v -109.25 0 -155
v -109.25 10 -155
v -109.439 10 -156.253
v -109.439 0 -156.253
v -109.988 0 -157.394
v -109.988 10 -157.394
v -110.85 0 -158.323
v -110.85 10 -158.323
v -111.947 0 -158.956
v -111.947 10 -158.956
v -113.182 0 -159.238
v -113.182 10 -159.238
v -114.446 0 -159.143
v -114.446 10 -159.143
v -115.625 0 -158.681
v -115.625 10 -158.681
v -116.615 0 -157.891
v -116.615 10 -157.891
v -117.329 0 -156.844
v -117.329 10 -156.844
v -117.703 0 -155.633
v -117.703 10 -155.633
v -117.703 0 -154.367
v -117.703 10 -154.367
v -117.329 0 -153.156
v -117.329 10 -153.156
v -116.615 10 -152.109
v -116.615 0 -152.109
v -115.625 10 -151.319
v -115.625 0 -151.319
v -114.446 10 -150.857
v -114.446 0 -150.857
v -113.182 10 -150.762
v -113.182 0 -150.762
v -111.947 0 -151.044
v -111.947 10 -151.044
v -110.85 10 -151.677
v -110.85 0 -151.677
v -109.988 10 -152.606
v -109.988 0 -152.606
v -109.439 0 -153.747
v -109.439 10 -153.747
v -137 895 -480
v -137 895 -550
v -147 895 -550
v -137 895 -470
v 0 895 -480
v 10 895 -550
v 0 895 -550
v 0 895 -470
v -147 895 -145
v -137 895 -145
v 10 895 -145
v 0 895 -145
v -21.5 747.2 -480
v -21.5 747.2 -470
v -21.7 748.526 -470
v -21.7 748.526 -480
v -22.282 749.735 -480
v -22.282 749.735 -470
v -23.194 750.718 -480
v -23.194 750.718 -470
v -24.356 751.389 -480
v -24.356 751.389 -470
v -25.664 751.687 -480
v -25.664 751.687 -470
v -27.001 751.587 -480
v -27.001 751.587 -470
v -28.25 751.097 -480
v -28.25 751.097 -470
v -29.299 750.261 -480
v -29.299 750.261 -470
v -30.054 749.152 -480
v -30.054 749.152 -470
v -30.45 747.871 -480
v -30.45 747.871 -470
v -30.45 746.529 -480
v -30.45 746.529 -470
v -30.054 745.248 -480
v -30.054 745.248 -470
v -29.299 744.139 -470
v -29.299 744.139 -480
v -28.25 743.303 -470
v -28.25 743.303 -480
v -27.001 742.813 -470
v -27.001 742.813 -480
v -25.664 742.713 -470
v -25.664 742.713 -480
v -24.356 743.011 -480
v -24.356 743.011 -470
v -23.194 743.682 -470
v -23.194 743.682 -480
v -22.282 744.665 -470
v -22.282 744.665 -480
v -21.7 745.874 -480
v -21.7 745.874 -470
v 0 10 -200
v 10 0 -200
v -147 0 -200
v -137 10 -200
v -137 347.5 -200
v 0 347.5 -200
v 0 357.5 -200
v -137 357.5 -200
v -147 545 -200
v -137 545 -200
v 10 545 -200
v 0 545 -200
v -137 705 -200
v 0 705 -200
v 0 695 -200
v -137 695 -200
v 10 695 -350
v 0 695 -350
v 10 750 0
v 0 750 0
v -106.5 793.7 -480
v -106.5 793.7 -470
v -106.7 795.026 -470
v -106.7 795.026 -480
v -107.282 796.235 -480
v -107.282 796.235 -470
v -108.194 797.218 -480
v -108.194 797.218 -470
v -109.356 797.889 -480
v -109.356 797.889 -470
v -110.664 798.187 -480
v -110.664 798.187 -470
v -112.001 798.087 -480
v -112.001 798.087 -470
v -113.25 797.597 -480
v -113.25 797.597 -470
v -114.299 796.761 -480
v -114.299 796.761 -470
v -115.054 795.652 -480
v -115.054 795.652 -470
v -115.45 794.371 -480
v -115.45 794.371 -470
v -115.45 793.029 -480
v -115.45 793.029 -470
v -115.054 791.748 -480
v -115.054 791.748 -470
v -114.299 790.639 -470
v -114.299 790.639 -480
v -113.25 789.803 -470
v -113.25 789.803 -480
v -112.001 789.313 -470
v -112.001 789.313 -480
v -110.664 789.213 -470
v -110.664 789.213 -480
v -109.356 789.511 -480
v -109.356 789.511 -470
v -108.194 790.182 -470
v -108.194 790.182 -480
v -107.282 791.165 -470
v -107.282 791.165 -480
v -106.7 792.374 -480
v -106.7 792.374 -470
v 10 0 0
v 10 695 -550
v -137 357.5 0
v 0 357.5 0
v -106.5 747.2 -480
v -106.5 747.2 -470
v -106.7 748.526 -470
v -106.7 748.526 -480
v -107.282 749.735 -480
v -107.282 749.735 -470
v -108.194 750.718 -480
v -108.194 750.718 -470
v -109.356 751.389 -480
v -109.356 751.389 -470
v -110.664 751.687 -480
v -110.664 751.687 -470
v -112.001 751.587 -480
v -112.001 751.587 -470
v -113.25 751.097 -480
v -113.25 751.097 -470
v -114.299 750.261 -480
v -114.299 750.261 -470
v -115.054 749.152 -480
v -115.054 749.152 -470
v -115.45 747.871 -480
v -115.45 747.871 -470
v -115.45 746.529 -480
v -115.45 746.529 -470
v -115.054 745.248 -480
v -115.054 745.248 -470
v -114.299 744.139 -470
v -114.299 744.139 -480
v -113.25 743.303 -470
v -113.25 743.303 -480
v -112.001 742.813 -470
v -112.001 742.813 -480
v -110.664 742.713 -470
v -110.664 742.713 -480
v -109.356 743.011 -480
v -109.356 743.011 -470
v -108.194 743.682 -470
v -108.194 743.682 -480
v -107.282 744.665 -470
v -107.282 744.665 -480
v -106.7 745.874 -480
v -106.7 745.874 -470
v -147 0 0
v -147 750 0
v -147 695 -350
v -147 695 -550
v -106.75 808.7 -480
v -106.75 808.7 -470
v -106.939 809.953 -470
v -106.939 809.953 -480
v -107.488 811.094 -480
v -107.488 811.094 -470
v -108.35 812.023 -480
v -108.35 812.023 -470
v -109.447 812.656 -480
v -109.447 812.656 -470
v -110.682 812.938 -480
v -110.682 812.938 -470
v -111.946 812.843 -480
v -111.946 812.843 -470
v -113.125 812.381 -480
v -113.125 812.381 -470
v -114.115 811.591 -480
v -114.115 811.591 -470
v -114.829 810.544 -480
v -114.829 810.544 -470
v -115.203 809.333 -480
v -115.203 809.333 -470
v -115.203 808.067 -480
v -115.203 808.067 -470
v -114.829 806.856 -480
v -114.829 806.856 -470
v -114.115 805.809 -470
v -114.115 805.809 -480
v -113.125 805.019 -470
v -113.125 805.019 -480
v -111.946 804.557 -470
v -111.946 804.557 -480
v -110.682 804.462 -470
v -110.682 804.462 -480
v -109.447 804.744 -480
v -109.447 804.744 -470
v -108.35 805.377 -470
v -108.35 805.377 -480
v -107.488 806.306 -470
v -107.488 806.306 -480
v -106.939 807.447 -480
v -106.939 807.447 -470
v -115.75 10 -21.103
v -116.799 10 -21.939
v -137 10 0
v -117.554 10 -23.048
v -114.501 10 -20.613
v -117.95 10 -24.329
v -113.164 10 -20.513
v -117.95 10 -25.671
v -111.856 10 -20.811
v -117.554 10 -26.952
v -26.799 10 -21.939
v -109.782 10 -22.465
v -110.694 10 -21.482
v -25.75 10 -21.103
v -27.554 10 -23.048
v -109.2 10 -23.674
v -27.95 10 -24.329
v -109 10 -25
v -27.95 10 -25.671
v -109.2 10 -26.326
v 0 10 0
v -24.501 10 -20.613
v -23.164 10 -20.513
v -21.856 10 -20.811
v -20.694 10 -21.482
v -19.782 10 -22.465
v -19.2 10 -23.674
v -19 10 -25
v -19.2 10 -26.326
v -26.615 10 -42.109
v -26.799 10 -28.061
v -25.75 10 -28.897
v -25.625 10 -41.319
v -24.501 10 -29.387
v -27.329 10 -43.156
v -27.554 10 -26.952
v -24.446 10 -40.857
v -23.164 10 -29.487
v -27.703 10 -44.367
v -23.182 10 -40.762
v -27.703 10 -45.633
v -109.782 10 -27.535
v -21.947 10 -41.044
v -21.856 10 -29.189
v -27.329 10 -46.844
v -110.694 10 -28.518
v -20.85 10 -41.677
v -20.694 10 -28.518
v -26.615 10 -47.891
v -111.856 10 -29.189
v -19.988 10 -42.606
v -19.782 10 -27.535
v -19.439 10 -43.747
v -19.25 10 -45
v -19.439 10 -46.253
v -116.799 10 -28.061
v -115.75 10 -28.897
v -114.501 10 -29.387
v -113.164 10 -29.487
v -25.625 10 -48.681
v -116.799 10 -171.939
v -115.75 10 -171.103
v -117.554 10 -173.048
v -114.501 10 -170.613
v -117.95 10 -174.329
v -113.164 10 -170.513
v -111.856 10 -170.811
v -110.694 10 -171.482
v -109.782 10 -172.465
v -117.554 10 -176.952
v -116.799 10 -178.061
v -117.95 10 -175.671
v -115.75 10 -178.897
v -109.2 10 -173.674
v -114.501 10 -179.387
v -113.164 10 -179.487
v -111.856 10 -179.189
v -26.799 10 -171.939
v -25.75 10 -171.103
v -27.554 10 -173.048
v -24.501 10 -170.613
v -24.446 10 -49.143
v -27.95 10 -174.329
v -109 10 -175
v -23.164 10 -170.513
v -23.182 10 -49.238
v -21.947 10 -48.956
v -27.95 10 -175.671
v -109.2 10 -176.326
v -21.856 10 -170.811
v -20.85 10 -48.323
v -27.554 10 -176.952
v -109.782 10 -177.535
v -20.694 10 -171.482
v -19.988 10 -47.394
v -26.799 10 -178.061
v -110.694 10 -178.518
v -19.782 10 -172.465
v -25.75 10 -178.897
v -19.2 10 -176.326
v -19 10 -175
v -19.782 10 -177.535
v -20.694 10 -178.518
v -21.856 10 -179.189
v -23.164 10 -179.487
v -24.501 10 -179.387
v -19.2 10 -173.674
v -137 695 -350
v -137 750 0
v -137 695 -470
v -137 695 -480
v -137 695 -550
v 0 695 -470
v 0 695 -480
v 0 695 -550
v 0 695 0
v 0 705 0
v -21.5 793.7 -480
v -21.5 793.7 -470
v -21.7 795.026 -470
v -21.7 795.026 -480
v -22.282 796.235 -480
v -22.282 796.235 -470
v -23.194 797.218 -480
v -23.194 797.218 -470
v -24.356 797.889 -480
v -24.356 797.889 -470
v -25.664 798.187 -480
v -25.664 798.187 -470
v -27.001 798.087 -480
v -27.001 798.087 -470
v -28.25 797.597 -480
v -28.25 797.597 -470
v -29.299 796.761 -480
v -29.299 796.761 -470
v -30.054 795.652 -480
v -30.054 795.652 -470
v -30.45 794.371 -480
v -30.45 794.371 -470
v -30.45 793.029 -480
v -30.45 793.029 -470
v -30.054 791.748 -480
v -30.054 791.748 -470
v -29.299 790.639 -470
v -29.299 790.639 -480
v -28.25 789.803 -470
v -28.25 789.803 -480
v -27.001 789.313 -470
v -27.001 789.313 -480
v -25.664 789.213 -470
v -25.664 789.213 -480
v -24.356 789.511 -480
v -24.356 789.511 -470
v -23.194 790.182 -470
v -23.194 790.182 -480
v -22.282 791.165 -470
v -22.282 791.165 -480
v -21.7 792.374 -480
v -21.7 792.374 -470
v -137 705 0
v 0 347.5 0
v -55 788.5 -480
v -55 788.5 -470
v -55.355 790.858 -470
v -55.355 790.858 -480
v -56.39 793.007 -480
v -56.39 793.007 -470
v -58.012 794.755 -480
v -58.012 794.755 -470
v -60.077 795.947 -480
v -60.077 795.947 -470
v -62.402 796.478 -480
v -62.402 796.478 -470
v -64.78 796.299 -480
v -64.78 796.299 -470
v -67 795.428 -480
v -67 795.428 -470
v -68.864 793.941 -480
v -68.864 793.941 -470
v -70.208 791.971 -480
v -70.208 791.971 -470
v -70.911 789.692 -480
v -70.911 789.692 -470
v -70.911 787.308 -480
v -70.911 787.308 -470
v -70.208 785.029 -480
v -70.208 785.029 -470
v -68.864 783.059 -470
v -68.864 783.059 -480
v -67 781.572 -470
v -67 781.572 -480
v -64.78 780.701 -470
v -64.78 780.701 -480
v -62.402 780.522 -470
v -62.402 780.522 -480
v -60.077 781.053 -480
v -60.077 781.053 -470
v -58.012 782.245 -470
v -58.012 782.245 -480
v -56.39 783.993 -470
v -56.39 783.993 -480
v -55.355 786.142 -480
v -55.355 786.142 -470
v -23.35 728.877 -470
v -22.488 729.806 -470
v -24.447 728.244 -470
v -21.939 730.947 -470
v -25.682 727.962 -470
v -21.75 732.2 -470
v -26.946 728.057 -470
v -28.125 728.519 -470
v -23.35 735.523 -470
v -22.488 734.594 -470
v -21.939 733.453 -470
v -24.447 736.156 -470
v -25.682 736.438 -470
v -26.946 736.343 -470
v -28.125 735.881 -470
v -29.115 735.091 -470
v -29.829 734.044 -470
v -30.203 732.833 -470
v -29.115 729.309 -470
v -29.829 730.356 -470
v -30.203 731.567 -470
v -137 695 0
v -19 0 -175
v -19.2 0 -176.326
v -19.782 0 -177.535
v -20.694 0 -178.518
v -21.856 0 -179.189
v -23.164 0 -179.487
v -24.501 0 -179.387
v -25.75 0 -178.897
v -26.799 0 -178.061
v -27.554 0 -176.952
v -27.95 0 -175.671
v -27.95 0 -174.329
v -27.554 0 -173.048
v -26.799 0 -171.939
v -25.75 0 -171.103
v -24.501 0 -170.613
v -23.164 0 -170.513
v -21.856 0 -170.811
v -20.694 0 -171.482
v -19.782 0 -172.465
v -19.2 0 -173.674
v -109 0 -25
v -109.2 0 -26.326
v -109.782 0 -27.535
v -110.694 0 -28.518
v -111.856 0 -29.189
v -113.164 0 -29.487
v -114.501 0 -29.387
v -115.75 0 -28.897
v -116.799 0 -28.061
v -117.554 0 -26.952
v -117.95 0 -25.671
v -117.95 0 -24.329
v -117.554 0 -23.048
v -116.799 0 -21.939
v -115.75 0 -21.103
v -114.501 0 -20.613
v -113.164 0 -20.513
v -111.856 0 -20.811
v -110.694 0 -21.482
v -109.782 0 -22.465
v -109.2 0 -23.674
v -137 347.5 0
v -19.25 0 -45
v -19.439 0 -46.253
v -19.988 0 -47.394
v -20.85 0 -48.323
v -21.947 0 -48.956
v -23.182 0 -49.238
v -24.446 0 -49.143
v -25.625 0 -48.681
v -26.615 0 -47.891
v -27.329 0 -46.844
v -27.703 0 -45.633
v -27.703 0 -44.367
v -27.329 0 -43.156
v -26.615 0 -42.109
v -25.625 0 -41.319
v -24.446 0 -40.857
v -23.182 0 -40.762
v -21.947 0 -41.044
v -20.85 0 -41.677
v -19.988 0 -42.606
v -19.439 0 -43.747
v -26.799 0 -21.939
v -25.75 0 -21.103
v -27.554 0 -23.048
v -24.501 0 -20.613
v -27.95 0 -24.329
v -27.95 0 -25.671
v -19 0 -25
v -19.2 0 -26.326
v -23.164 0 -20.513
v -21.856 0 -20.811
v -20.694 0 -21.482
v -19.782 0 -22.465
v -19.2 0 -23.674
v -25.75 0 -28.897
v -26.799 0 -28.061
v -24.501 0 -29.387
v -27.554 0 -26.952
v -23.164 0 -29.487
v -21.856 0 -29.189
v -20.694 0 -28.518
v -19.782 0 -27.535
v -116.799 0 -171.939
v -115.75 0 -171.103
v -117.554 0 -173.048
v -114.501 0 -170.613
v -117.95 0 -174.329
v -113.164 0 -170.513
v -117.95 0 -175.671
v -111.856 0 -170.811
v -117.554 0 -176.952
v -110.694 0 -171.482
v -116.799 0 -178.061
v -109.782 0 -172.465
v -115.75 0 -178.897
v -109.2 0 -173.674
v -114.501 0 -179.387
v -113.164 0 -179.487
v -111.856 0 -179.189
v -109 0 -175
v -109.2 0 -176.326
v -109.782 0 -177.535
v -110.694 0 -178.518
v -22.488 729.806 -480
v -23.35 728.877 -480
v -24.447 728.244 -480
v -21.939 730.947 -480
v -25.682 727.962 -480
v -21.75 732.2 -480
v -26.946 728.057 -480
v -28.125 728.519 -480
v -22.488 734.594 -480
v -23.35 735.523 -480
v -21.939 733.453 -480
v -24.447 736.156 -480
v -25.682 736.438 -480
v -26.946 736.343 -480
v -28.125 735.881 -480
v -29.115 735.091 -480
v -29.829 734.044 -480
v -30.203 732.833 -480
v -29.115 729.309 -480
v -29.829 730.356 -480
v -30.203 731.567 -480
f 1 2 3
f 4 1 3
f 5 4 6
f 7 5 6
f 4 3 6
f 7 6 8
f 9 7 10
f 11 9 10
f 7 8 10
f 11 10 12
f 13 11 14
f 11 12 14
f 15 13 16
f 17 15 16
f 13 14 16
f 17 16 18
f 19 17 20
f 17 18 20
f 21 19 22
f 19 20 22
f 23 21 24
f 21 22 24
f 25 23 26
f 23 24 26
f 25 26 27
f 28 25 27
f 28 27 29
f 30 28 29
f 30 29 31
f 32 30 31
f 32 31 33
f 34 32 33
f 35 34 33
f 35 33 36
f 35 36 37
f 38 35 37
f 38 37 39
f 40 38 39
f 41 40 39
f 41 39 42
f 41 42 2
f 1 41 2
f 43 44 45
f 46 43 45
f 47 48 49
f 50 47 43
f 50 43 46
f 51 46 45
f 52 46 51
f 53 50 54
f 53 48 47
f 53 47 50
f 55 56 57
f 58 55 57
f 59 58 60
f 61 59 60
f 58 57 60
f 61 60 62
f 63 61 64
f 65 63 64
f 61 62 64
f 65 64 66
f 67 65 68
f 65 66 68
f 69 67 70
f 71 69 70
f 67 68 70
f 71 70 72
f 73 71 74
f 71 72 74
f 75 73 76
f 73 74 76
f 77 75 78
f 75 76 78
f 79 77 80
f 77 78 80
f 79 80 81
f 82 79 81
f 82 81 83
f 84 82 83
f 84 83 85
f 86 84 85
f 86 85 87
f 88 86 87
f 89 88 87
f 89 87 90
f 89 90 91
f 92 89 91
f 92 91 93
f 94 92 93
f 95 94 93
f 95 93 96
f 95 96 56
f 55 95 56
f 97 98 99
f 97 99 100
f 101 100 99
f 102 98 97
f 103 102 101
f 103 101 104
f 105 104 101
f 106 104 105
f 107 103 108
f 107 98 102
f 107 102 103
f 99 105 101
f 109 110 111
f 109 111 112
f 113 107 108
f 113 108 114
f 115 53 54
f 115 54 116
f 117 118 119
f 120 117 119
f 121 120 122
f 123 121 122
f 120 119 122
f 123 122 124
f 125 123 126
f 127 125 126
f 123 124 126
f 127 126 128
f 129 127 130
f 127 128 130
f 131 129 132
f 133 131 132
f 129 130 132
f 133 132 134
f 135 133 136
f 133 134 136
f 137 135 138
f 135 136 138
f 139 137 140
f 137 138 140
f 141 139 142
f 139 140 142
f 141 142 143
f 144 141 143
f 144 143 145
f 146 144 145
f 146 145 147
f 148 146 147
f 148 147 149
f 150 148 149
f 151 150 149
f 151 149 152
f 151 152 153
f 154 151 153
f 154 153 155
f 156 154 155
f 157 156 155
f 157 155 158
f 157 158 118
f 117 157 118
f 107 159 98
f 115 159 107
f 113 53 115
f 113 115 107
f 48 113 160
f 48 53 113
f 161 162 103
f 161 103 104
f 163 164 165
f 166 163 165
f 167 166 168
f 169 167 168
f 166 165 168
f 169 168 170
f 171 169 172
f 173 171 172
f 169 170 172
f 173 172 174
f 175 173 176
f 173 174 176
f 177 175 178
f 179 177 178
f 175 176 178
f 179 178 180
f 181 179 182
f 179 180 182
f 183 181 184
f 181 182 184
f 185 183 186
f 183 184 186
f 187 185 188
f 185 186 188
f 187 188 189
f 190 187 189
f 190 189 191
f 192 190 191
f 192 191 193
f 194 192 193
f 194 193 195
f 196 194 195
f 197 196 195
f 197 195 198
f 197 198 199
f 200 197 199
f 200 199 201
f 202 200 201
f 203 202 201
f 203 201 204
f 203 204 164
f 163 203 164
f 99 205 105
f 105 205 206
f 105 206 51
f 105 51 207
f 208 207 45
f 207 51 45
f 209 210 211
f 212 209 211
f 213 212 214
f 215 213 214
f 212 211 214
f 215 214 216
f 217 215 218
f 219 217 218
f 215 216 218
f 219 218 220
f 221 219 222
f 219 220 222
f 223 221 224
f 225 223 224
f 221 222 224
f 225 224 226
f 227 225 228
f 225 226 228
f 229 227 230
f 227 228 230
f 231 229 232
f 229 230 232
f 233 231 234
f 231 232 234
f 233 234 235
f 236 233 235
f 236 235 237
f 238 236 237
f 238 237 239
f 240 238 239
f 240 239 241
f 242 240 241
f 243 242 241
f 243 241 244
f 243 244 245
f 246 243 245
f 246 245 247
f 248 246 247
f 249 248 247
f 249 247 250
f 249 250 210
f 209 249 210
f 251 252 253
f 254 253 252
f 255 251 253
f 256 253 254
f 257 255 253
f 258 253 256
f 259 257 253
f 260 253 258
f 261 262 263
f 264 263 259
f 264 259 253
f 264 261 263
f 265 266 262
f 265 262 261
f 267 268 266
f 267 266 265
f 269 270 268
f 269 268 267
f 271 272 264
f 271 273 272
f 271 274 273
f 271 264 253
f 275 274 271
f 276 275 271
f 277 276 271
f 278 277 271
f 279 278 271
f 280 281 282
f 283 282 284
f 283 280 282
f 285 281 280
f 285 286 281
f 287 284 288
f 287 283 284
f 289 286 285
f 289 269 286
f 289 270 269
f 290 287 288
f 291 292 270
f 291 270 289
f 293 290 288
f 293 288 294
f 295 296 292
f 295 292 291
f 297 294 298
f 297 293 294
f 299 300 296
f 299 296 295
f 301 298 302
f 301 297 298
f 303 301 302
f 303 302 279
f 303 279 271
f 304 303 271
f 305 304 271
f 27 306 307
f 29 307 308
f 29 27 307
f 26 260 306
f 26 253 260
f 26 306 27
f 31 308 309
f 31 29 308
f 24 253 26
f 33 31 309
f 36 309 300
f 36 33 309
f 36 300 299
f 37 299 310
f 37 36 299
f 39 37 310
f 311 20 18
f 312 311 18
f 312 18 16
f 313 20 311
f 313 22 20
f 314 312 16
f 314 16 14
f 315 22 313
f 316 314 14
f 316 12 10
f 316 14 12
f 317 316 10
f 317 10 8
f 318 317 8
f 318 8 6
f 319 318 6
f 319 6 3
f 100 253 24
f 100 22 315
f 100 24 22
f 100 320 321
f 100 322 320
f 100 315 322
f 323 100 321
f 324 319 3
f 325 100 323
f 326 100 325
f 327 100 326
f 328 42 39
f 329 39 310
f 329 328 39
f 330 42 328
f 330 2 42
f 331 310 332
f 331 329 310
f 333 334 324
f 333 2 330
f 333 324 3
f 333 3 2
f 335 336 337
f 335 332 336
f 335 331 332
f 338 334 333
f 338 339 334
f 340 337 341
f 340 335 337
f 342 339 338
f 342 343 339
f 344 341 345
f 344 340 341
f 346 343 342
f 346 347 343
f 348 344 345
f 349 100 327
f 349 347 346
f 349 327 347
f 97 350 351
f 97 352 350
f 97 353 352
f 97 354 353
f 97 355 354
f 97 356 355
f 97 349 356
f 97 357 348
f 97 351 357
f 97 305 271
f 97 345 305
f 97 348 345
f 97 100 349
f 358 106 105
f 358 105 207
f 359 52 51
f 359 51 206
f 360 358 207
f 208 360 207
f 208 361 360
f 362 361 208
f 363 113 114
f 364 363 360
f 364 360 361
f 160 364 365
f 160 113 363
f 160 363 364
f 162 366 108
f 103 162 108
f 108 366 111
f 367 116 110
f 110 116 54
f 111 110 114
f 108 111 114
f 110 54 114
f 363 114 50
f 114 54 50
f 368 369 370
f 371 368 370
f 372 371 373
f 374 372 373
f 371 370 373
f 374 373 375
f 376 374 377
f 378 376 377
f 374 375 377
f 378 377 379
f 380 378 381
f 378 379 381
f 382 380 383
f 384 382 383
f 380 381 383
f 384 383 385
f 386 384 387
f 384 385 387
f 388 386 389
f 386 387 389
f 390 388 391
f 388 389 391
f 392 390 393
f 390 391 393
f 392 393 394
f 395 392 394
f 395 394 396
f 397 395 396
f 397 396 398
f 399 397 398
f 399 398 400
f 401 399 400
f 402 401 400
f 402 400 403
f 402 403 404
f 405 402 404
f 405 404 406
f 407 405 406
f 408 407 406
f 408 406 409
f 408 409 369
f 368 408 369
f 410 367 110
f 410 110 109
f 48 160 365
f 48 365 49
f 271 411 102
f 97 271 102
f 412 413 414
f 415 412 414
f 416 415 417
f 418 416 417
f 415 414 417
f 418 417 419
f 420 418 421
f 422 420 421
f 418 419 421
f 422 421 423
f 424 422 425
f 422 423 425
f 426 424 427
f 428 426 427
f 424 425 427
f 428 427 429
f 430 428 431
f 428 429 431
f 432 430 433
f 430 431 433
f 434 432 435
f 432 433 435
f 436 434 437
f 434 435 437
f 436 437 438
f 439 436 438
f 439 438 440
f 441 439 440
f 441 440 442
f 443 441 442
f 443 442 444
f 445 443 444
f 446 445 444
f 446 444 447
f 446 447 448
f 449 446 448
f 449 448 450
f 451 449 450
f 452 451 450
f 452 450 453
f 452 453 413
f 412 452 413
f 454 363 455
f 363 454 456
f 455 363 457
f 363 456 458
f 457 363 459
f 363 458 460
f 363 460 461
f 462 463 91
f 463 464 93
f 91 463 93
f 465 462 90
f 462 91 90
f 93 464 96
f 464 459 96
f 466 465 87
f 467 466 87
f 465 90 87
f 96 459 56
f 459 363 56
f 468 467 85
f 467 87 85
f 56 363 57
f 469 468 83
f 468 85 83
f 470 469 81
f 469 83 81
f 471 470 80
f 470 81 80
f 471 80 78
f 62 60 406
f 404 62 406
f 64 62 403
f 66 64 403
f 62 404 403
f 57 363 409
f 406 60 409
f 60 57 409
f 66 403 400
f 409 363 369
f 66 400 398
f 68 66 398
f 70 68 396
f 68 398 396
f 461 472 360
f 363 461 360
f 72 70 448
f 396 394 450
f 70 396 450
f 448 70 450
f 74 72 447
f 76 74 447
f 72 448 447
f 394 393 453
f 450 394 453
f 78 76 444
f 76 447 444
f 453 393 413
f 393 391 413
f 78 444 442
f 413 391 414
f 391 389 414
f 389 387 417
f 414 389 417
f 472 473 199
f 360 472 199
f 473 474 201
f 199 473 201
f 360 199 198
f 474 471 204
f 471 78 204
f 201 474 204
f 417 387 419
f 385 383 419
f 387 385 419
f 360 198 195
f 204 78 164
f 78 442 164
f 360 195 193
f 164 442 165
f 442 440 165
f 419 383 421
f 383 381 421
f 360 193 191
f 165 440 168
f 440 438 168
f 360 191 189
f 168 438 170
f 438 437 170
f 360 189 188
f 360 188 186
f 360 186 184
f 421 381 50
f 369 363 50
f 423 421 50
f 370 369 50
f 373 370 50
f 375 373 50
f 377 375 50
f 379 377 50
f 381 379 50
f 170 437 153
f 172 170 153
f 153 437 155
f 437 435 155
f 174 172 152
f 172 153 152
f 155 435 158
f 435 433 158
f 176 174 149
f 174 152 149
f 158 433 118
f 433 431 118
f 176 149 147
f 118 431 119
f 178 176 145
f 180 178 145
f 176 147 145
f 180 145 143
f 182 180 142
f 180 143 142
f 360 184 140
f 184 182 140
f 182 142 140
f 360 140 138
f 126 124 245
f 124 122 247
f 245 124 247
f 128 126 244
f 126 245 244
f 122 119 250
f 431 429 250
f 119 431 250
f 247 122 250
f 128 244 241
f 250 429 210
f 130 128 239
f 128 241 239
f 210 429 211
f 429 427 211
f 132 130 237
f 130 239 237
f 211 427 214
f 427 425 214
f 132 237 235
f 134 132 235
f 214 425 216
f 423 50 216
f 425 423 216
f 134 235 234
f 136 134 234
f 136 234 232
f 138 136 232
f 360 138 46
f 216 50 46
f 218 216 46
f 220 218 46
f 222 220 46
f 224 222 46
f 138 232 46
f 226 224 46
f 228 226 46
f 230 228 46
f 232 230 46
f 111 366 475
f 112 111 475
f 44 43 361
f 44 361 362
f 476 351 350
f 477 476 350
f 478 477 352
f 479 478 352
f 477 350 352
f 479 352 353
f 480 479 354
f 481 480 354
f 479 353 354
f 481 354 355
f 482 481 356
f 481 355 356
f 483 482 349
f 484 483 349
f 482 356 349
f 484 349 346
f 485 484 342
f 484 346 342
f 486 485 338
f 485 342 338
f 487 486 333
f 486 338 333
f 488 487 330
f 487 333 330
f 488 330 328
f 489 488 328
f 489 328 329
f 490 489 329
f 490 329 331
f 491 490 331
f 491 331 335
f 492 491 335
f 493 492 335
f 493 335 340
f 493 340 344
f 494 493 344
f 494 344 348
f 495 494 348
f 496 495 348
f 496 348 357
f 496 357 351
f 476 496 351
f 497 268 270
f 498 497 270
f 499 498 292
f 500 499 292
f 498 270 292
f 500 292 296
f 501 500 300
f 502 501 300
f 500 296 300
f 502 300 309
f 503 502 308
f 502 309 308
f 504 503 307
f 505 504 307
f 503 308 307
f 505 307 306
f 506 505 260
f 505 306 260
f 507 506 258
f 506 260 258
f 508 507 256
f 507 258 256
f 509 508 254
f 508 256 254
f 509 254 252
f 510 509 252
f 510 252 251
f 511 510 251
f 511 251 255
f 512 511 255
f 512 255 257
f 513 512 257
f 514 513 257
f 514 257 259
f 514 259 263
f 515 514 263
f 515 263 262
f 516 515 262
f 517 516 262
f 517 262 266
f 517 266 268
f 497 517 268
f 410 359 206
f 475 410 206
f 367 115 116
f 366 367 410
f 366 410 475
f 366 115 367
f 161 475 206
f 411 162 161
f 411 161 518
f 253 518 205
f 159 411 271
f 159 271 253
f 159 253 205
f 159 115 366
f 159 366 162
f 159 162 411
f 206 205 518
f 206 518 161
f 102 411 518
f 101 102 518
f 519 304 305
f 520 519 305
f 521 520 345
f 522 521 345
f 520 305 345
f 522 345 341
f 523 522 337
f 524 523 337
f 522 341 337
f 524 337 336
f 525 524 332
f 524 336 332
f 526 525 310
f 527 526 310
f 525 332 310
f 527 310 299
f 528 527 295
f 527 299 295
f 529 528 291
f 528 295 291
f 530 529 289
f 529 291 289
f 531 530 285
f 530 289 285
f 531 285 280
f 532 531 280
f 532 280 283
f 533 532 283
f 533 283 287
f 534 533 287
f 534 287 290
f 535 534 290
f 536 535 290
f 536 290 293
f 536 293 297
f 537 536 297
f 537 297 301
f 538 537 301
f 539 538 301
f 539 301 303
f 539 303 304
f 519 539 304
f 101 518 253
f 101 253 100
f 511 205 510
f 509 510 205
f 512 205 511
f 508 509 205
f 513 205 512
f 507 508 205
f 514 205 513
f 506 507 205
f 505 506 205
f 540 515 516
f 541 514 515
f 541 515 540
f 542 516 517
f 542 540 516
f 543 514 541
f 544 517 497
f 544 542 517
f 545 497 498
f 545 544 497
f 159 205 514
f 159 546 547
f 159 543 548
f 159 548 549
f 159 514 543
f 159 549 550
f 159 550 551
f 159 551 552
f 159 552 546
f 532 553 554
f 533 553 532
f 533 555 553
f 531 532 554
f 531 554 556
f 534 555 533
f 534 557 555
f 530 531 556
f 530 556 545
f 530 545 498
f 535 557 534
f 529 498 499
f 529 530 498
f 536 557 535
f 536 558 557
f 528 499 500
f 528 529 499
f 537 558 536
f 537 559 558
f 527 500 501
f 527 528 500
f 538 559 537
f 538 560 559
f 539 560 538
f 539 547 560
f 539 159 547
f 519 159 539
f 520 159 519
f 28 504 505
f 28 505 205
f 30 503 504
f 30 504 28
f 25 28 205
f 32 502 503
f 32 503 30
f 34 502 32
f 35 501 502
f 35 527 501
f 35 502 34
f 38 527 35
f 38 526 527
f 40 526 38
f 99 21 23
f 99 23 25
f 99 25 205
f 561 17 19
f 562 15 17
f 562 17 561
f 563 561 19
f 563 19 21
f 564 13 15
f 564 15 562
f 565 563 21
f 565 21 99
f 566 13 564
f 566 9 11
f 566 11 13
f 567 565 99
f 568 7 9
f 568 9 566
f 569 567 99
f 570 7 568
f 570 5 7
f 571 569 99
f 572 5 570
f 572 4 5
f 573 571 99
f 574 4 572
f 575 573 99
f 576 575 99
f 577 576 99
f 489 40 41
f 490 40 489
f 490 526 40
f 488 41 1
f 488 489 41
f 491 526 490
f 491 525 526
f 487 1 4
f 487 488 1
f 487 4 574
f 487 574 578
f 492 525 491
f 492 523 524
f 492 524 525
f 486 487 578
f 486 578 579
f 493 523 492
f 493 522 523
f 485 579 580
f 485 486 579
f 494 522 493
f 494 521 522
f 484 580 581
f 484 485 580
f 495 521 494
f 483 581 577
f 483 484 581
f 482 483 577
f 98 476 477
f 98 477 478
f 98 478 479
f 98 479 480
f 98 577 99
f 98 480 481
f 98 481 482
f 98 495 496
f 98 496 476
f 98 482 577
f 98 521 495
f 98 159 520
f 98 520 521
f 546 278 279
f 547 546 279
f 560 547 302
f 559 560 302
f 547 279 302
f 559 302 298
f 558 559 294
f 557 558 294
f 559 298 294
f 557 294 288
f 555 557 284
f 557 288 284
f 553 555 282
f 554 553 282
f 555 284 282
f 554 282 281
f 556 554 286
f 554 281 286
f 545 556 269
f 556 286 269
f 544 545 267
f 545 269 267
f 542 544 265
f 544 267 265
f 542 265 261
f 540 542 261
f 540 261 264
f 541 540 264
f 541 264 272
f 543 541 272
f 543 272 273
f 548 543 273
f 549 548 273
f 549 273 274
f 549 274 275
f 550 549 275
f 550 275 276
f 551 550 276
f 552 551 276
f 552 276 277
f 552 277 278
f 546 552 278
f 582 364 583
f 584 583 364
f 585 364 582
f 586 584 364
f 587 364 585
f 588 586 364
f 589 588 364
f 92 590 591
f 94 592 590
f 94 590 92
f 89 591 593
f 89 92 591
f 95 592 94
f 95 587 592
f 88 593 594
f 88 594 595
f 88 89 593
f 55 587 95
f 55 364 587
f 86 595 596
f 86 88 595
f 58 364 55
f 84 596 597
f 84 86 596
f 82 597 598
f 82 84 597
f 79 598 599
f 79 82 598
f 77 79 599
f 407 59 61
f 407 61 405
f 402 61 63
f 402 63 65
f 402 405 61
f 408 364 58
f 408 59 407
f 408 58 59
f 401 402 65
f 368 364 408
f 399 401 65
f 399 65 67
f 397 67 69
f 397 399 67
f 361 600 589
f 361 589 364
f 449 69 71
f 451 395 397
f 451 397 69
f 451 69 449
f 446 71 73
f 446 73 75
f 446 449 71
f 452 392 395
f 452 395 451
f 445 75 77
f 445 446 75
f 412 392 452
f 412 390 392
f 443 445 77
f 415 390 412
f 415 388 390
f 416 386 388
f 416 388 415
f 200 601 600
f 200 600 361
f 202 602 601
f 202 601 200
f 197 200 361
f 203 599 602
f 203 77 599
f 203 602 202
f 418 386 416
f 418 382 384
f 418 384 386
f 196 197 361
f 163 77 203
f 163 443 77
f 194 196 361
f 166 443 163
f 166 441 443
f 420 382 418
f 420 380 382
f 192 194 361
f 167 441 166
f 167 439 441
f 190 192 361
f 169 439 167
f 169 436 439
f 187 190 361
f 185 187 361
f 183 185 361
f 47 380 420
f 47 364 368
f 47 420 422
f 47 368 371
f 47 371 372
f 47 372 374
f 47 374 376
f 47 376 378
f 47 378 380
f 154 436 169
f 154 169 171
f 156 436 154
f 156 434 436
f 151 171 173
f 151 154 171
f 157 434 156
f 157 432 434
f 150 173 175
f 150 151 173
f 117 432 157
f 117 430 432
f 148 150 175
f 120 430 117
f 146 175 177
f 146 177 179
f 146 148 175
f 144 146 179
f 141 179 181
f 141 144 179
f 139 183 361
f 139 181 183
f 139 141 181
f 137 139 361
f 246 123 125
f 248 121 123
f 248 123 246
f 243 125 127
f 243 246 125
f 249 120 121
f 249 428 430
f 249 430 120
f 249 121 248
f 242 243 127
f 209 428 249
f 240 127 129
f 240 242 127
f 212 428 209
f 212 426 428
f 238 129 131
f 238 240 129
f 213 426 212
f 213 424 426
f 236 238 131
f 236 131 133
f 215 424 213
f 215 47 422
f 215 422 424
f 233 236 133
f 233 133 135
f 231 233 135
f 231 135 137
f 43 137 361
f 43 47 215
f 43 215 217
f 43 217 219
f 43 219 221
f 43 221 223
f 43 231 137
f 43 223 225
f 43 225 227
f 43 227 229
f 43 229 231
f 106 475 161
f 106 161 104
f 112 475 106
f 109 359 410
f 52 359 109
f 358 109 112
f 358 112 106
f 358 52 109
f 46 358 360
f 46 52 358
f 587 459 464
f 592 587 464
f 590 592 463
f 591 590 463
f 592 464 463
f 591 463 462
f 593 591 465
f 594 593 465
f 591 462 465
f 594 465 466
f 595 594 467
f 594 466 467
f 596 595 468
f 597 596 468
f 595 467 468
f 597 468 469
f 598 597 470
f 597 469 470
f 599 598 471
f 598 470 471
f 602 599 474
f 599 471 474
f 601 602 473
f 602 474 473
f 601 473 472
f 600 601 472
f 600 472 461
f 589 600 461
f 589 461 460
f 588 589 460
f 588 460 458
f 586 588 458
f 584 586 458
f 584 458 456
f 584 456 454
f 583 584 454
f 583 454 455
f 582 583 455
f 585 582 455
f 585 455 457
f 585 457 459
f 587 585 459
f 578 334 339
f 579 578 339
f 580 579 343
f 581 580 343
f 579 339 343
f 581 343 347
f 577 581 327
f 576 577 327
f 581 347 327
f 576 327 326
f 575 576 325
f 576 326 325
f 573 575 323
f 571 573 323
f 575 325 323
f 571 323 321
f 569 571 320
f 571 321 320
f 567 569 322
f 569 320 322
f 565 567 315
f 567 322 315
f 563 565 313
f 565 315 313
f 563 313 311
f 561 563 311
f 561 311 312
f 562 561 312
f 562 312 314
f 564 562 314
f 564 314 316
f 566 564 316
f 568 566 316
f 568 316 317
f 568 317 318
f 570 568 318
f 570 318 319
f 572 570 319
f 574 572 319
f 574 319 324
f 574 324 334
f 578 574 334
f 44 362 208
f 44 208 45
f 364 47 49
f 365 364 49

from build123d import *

# Parameters (mm, degrees)
BOSS_EXTRUDE1_DEPTH      = 10
BOSS_EXTRUDE1_DEPTH_BACK = 147
SKETCH3_W                = 137
SKETCH3_H                = 550
CUT_EXTRUDE1_DEPTH       = 885
SKETCH4_W                = 137
SKETCH4_H                = 200
BOSS_EXTRUDE2_DEPTH      = 10
CUT_EXTRUDE3_REACH       = 82
SKETCH6_R                = 4.5
SKETCH6_R_2              = 8
SKETCH6_R_3              = 4.25
SKETCH8_W                = 157
SKETCH8_H                = 200
BOSS_EXTRUDE3_DEPTH      = 10
LPATTERN1_COUNT          = 3
LPATTERN1_PITCH          = 347.5
CUT_EXTRUDE4_REACH       = 12
SKETCH7_R                = 4.5
SKETCH7_R_2              = 4.25


with BuildPart() as part:
    # Sketch1 → Boss-Extrude1 (new body, two sides)
    with BuildSketch(Plane(origin=(0, 0, 0), x_dir=(0, 0, -1), z_dir=(1, 0, 0))) as boss_extrude1_sk:
        Polygon((200, 695), (200, 545), (350, 695), align=None)
        Polygon((200, 0), (200, 695), (550, 695), (550, 895), (145, 895), (0, 750), (0, 0), align=None)
    extrude(amount=BOSS_EXTRUDE1_DEPTH)
    extrude(boss_extrude1_sk.sketch, amount=-BOSS_EXTRUDE1_DEPTH_BACK)

    # Sketch3 → Cut-Extrude1 (cut)
    with BuildSketch(Plane(origin=(0, 895, 0), x_dir=(1, 0, 0), z_dir=(0, 1, 0))):
        with Locations((-68.5, 275)):
            Rectangle(SKETCH3_W, SKETCH3_H)
    extrude(amount=-CUT_EXTRUDE1_DEPTH, mode=Mode.SUBTRACT)

    # Sketch4 → Boss-Extrude2 (add)
    with BuildSketch(Plane(origin=(0, 0, -480), x_dir=(-1, 0, 0), z_dir=(0, 0, -1))):
        with Locations((68.5, 795)):
            Rectangle(SKETCH4_W, SKETCH4_H)
    extrude(amount=-BOSS_EXTRUDE2_DEPTH)

    # Sketch6 → Cut-Extrude3 (cut, up to next)
    with BuildSketch(Plane.XY.offset(-470), mode=Mode.PRIVATE) as cut_extrude3_sk1:
        with Locations((-111, 747.2)):
            Circle(SKETCH6_R)
    cut_extrude3_tool1 = extrude(cut_extrude3_sk1.sketch, amount=-CUT_EXTRUDE3_REACH, mode=Mode.PRIVATE) & part.part
    add(cut_extrude3_tool1.solids().sort_by_distance((-111, 747.2, -470))[0], mode=Mode.SUBTRACT)
    # Sketch6 → Cut-Extrude3 (cut, up to next)
    with BuildSketch(Plane.XY.offset(-470), mode=Mode.PRIVATE) as cut_extrude3_sk2:
        with Locations((-26, 747.2)):
            Circle(SKETCH6_R)
    cut_extrude3_tool2 = extrude(cut_extrude3_sk2.sketch, amount=-CUT_EXTRUDE3_REACH, mode=Mode.PRIVATE) & part.part
    add(cut_extrude3_tool2.solids().sort_by_distance((-26, 747.2, -470))[0], mode=Mode.SUBTRACT)
    # Sketch6 → Cut-Extrude3 (cut, up to next)
    with BuildSketch(Plane.XY.offset(-470), mode=Mode.PRIVATE) as cut_extrude3_sk3:
        with Locations((-111, 793.7)):
            Circle(SKETCH6_R)
    cut_extrude3_tool3 = extrude(cut_extrude3_sk3.sketch, amount=-CUT_EXTRUDE3_REACH, mode=Mode.PRIVATE) & part.part
    add(cut_extrude3_tool3.solids().sort_by_distance((-111, 793.7, -470))[0], mode=Mode.SUBTRACT)
    # Sketch6 → Cut-Extrude3 (cut, up to next)
    with BuildSketch(Plane.XY.offset(-470), mode=Mode.PRIVATE) as cut_extrude3_sk4:
        with Locations((-26, 793.7)):
            Circle(SKETCH6_R)
    cut_extrude3_tool4 = extrude(cut_extrude3_sk4.sketch, amount=-CUT_EXTRUDE3_REACH, mode=Mode.PRIVATE) & part.part
    add(cut_extrude3_tool4.solids().sort_by_distance((-26, 793.7, -470))[0], mode=Mode.SUBTRACT)
    # Sketch6 → Cut-Extrude3 (cut, up to next)
    with BuildSketch(Plane.XY.offset(-470), mode=Mode.PRIVATE) as cut_extrude3_sk5:
        with Locations((-63, 788.5)):
            Circle(SKETCH6_R_2)
    cut_extrude3_tool5 = extrude(cut_extrude3_sk5.sketch, amount=-CUT_EXTRUDE3_REACH, mode=Mode.PRIVATE) & part.part
    add(cut_extrude3_tool5.solids().sort_by_distance((-63, 788.5, -470))[0], mode=Mode.SUBTRACT)
    # Sketch6 → Cut-Extrude3 (cut, up to next)
    with BuildSketch(Plane.XY.offset(-470), mode=Mode.PRIVATE) as cut_extrude3_sk6:
        with Locations((-111, 808.7)):
            Circle(SKETCH6_R_3)
    cut_extrude3_tool6 = extrude(cut_extrude3_sk6.sketch, amount=-CUT_EXTRUDE3_REACH, mode=Mode.PRIVATE) & part.part
    add(cut_extrude3_tool6.solids().sort_by_distance((-111, 808.7, -470))[0], mode=Mode.SUBTRACT)
    # Sketch6 → Cut-Extrude3 (cut, up to next)
    with BuildSketch(Plane.XY.offset(-470), mode=Mode.PRIVATE) as cut_extrude3_sk7:
        with Locations((-26, 732.2)):
            Circle(SKETCH6_R_3)
    cut_extrude3_tool7 = extrude(cut_extrude3_sk7.sketch, amount=-CUT_EXTRUDE3_REACH, mode=Mode.PRIVATE) & part.part
    add(cut_extrude3_tool7.solids().sort_by_distance((-26, 732.2, -470))[0], mode=Mode.SUBTRACT)

    # Sketch8 → Boss-Extrude3 (add)
    with BuildSketch(Plane(origin=(0, 705, 0), x_dir=(-1, 0, 0), z_dir=(0, -1, 0))):
        with Locations((68.5, 100)):
            Rectangle(SKETCH8_W, SKETCH8_H)
    boss_extrude3 = extrude(amount=BOSS_EXTRUDE3_DEPTH)

    # LPattern1: Boss-Extrude3 ×3
    with Locations(*[(0, -i * LPATTERN1_PITCH, 0) for i in range(1, LPATTERN1_COUNT)]):
        add(boss_extrude3)

    # Sketch7 → Cut-Extrude4 (cut, up to next)
    with BuildSketch(Plane(origin=(0, 10, 0), x_dir=(1, 0, 0), z_dir=(0, 1, 0)), mode=Mode.PRIVATE) as cut_extrude4_sk1:
        with Locations((-113.5, 175)):
            Circle(SKETCH7_R)
    cut_extrude4_tool1 = extrude(cut_extrude4_sk1.sketch, amount=-CUT_EXTRUDE4_REACH, mode=Mode.PRIVATE) & part.part
    add(cut_extrude4_tool1.solids().sort_by_distance((-113.5, 10, -175))[0], mode=Mode.SUBTRACT)
    # Sketch7 → Cut-Extrude4 (cut, up to next)
    with BuildSketch(Plane(origin=(0, 10, 0), x_dir=(1, 0, 0), z_dir=(0, 1, 0)), mode=Mode.PRIVATE) as cut_extrude4_sk2:
        with Locations((-23.5, 175)):
            Circle(SKETCH7_R)
    cut_extrude4_tool2 = extrude(cut_extrude4_sk2.sketch, amount=-CUT_EXTRUDE4_REACH, mode=Mode.PRIVATE) & part.part
    add(cut_extrude4_tool2.solids().sort_by_distance((-23.5, 10, -175))[0], mode=Mode.SUBTRACT)
    # Sketch7 → Cut-Extrude4 (cut, up to next)
    with BuildSketch(Plane(origin=(0, 10, 0), x_dir=(1, 0, 0), z_dir=(0, 1, 0)), mode=Mode.PRIVATE) as cut_extrude4_sk3:
        with Locations((-23.5, 25)):
            Circle(SKETCH7_R)
    cut_extrude4_tool3 = extrude(cut_extrude4_sk3.sketch, amount=-CUT_EXTRUDE4_REACH, mode=Mode.PRIVATE) & part.part
    add(cut_extrude4_tool3.solids().sort_by_distance((-23.5, 10, -25))[0], mode=Mode.SUBTRACT)
    # Sketch7 → Cut-Extrude4 (cut, up to next)
    with BuildSketch(Plane(origin=(0, 10, 0), x_dir=(1, 0, 0), z_dir=(0, 1, 0)), mode=Mode.PRIVATE) as cut_extrude4_sk4:
        with Locations((-113.5, 25)):
            Circle(SKETCH7_R)
    cut_extrude4_tool4 = extrude(cut_extrude4_sk4.sketch, amount=-CUT_EXTRUDE4_REACH, mode=Mode.PRIVATE) & part.part
    add(cut_extrude4_tool4.solids().sort_by_distance((-113.5, 10, -25))[0], mode=Mode.SUBTRACT)
    # Sketch7 → Cut-Extrude4 (cut, up to next)
    with BuildSketch(Plane(origin=(0, 10, 0), x_dir=(1, 0, 0), z_dir=(0, 1, 0)), mode=Mode.PRIVATE) as cut_extrude4_sk5:
        with Locations((-113.5, 155)):
            Circle(SKETCH7_R_2)
    cut_extrude4_tool5 = extrude(cut_extrude4_sk5.sketch, amount=-CUT_EXTRUDE4_REACH, mode=Mode.PRIVATE) & part.part
    add(cut_extrude4_tool5.solids().sort_by_distance((-113.5, 10, -155))[0], mode=Mode.SUBTRACT)
    # Sketch7 → Cut-Extrude4 (cut, up to next)
    with BuildSketch(Plane(origin=(0, 10, 0), x_dir=(1, 0, 0), z_dir=(0, 1, 0)), mode=Mode.PRIVATE) as cut_extrude4_sk6:
        with Locations((-23.5, 45)):
            Circle(SKETCH7_R_2)
    cut_extrude4_tool6 = extrude(cut_extrude4_sk6.sketch, amount=-CUT_EXTRUDE4_REACH, mode=Mode.PRIVATE) & part.part
    add(cut_extrude4_tool6.solids().sort_by_distance((-23.5, 10, -45))[0], mode=Mode.SUBTRACT)


solid = part.part
